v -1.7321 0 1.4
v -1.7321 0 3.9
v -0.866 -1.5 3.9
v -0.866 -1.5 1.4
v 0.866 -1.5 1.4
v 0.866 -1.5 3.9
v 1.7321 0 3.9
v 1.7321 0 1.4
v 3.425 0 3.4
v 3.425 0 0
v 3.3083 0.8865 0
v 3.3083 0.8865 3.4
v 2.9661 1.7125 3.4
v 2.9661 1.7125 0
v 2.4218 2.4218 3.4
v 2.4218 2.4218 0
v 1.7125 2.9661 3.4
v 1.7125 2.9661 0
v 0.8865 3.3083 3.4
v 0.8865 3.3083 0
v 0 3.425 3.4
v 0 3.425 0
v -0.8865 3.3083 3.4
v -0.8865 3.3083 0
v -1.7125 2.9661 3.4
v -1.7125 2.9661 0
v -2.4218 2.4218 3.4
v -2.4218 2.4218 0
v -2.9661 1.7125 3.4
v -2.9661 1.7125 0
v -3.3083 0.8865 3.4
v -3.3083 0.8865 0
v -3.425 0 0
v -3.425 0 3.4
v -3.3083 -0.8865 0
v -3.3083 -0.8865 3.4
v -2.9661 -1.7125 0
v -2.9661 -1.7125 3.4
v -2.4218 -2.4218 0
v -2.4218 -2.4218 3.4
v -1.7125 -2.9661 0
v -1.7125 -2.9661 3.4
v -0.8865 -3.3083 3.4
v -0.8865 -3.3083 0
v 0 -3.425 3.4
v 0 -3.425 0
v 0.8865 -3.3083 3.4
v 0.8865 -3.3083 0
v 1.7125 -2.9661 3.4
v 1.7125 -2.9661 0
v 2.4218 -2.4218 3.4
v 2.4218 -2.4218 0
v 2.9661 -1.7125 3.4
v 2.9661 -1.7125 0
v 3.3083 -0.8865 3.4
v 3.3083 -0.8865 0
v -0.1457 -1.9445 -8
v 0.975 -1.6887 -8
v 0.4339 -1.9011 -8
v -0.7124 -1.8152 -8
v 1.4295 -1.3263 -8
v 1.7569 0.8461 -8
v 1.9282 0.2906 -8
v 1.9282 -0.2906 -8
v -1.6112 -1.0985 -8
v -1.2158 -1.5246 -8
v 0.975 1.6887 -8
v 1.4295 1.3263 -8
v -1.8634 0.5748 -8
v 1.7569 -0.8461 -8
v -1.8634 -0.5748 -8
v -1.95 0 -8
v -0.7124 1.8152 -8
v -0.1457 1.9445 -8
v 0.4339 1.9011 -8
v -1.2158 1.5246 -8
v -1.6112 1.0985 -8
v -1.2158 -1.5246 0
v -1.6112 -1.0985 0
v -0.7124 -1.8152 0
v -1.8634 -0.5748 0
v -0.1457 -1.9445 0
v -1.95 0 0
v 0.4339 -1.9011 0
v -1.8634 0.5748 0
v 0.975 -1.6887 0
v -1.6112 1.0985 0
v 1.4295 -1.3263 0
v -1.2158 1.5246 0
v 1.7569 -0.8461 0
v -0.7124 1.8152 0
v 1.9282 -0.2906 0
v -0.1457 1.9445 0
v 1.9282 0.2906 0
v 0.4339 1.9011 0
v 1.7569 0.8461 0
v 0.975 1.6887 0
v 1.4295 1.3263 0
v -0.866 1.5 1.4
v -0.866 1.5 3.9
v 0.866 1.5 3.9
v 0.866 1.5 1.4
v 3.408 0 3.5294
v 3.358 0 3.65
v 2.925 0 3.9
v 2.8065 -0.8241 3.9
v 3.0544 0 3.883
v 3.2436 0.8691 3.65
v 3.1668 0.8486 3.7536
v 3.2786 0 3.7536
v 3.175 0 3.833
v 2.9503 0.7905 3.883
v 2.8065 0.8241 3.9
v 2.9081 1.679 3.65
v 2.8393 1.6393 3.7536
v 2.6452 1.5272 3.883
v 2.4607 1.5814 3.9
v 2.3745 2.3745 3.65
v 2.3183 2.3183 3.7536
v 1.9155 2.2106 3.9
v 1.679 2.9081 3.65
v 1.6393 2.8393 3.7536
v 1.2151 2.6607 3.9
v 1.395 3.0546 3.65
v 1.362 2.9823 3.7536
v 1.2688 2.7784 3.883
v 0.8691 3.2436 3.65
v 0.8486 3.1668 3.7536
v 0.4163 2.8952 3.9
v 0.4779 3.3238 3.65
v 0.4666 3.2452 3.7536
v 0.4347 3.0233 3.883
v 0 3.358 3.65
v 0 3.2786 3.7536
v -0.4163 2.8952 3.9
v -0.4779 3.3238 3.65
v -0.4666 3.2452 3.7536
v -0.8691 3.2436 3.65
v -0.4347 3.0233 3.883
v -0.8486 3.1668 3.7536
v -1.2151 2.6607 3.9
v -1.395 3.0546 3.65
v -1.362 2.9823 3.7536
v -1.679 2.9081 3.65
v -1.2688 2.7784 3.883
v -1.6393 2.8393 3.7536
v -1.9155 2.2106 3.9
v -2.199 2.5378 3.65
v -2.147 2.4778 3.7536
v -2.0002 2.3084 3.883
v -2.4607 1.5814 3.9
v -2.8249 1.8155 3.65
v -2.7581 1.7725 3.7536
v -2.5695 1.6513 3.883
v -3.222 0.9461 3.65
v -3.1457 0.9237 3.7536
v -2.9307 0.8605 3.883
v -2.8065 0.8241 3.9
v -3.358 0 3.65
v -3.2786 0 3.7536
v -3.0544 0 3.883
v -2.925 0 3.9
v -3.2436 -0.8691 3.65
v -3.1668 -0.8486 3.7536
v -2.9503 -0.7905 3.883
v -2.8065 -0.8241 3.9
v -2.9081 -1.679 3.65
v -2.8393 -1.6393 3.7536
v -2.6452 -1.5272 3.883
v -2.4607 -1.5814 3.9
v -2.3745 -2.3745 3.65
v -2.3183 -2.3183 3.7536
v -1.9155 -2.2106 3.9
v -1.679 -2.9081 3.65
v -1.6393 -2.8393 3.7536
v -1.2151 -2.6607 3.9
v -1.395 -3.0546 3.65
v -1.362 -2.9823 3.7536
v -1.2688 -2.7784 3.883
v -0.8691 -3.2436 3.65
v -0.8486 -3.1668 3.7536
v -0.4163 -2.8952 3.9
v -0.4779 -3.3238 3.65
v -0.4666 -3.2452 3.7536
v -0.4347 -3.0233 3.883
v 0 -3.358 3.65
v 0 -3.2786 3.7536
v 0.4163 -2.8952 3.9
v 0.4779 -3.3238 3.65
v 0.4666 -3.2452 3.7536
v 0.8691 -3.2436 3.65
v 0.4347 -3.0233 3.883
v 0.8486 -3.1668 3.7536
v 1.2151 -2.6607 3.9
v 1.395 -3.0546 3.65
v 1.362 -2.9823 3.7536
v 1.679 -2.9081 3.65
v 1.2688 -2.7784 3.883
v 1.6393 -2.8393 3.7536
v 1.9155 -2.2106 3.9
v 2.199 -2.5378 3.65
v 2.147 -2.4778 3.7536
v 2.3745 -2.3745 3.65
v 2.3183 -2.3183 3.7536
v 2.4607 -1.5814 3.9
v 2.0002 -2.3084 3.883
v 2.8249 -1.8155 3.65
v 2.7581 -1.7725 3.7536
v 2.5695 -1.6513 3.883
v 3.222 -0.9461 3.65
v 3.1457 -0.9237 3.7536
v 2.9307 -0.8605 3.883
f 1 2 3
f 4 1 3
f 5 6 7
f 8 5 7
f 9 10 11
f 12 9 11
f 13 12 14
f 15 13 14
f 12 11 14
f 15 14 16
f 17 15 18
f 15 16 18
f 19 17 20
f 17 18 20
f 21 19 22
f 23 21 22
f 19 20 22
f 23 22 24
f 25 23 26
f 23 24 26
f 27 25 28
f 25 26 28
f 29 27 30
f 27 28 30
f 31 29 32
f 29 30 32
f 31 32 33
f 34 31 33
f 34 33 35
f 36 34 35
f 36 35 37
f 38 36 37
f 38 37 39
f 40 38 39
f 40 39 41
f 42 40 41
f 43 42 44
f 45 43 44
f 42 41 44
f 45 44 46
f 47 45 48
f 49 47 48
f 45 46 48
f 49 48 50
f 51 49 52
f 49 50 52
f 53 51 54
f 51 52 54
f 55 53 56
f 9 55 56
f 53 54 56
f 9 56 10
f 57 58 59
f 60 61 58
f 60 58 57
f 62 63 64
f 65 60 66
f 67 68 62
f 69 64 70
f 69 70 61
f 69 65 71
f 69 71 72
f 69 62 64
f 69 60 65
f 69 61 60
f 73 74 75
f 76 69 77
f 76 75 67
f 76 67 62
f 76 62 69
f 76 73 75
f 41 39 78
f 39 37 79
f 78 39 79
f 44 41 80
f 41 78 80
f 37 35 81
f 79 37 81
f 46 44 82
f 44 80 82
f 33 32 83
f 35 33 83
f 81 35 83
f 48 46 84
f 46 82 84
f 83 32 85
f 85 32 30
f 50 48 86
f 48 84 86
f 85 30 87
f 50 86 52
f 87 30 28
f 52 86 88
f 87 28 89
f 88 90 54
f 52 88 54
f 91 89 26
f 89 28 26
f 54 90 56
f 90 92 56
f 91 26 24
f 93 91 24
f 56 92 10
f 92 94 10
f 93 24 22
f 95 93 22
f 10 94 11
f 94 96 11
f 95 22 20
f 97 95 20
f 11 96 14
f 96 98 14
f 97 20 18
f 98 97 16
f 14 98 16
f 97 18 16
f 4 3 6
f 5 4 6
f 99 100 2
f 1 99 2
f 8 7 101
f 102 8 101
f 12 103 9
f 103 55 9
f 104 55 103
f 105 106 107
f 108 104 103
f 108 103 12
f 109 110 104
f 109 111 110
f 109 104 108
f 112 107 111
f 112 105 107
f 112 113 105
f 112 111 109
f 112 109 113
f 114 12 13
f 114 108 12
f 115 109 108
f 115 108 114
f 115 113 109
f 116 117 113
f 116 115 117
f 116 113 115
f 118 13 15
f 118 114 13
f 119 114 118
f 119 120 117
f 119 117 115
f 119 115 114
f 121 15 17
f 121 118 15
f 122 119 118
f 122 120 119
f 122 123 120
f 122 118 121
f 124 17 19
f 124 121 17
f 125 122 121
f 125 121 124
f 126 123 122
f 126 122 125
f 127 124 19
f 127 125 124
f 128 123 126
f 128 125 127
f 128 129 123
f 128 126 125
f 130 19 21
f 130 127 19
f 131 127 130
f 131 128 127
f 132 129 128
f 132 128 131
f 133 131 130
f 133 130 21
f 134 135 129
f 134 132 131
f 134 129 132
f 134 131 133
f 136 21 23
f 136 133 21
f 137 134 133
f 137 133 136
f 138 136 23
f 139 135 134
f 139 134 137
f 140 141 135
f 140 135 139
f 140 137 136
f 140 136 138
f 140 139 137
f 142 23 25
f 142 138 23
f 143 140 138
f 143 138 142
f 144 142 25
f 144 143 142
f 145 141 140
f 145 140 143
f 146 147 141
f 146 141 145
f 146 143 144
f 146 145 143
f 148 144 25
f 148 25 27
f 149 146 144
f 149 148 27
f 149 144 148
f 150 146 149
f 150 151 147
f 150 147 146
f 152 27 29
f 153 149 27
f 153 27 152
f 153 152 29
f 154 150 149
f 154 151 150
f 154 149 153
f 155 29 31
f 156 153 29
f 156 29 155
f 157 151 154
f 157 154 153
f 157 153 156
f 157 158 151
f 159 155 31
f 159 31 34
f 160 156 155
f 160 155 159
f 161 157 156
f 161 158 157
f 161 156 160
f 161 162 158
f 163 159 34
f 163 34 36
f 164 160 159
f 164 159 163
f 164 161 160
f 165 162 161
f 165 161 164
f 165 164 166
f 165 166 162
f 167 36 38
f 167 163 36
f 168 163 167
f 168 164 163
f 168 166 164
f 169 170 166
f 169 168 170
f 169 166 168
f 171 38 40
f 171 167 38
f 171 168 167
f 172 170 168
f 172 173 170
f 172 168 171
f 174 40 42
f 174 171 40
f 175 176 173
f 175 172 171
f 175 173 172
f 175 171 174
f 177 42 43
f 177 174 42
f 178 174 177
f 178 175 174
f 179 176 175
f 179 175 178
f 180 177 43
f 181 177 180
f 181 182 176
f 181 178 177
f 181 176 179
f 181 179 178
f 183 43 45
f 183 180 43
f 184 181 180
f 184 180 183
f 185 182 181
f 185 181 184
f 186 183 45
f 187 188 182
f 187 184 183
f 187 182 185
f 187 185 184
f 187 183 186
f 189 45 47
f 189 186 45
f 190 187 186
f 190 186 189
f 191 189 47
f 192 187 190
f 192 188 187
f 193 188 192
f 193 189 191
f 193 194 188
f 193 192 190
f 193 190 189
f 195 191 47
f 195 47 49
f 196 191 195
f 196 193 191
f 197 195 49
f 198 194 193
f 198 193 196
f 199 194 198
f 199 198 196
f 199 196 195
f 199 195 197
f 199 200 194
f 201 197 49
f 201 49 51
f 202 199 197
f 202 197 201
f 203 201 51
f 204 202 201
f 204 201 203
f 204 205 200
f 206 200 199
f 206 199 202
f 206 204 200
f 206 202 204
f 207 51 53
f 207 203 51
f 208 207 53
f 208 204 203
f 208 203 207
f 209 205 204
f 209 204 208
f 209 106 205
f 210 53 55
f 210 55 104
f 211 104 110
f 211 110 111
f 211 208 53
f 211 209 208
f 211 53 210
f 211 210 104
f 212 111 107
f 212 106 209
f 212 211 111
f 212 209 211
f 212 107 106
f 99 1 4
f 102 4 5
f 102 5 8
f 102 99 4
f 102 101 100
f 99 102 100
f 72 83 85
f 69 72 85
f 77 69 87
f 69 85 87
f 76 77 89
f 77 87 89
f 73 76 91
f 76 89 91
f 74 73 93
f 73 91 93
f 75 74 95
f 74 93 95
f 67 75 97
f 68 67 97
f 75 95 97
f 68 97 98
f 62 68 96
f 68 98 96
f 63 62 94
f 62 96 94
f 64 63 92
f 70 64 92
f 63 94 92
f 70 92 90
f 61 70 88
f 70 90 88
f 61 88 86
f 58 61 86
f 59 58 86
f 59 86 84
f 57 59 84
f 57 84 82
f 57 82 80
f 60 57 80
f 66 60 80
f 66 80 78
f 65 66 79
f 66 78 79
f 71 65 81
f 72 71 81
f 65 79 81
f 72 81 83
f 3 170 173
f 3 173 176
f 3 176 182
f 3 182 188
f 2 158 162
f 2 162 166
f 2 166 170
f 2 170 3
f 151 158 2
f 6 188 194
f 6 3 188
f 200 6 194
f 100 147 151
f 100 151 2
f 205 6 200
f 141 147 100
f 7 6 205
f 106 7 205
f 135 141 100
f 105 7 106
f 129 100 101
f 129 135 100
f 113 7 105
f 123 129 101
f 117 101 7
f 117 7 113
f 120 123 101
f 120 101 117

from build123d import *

# Parameters (mm, degrees)
SKETCH1_R           = 3.425
BOSS_EXTRUDE1_DEPTH = 3.9
SKETCH2_R           = 1.95
BOSS_EXTRUDE2_DEPTH = 8
CUT_EXTRUDE1_DEPTH  = 2.5
FILLET1_R           = 0.5


with BuildPart() as part:
    # Sketch1 → Boss-Extrude1 (new body)
    with BuildSketch(Plane.XY):
        Circle(SKETCH1_R)
    extrude(amount=BOSS_EXTRUDE1_DEPTH)

    # Sketch2 → Boss-Extrude2 (add)
    with BuildSketch(Plane(origin=(0, 0, 0), x_dir=(-1, 0, 0), z_dir=(0, 0, -1))):
        Circle(SKETCH2_R)
    extrude(amount=BOSS_EXTRUDE2_DEPTH)

    # Sketch3 → Cut-Extrude1 (cut)
    with BuildSketch(Plane.XY.offset(3.9)):
        Polygon((1.732050808, 0), (0.866025404, 1.5), (-0.866025404, 1.5), (-1.732050808, 0), (-0.866025404, -1.5), (0.866025404, -1.5), align=None)
    extrude(amount=-CUT_EXTRUDE1_DEPTH, mode=Mode.SUBTRACT)

    # Fillet1
    fillet1_edges = [part.edges().sort_by_distance(p)[0] for p in [
        (-3.425, 0, 3.9),
    ]]
    fillet(fillet1_edges, radius=FILLET1_R)


solid = part.part
